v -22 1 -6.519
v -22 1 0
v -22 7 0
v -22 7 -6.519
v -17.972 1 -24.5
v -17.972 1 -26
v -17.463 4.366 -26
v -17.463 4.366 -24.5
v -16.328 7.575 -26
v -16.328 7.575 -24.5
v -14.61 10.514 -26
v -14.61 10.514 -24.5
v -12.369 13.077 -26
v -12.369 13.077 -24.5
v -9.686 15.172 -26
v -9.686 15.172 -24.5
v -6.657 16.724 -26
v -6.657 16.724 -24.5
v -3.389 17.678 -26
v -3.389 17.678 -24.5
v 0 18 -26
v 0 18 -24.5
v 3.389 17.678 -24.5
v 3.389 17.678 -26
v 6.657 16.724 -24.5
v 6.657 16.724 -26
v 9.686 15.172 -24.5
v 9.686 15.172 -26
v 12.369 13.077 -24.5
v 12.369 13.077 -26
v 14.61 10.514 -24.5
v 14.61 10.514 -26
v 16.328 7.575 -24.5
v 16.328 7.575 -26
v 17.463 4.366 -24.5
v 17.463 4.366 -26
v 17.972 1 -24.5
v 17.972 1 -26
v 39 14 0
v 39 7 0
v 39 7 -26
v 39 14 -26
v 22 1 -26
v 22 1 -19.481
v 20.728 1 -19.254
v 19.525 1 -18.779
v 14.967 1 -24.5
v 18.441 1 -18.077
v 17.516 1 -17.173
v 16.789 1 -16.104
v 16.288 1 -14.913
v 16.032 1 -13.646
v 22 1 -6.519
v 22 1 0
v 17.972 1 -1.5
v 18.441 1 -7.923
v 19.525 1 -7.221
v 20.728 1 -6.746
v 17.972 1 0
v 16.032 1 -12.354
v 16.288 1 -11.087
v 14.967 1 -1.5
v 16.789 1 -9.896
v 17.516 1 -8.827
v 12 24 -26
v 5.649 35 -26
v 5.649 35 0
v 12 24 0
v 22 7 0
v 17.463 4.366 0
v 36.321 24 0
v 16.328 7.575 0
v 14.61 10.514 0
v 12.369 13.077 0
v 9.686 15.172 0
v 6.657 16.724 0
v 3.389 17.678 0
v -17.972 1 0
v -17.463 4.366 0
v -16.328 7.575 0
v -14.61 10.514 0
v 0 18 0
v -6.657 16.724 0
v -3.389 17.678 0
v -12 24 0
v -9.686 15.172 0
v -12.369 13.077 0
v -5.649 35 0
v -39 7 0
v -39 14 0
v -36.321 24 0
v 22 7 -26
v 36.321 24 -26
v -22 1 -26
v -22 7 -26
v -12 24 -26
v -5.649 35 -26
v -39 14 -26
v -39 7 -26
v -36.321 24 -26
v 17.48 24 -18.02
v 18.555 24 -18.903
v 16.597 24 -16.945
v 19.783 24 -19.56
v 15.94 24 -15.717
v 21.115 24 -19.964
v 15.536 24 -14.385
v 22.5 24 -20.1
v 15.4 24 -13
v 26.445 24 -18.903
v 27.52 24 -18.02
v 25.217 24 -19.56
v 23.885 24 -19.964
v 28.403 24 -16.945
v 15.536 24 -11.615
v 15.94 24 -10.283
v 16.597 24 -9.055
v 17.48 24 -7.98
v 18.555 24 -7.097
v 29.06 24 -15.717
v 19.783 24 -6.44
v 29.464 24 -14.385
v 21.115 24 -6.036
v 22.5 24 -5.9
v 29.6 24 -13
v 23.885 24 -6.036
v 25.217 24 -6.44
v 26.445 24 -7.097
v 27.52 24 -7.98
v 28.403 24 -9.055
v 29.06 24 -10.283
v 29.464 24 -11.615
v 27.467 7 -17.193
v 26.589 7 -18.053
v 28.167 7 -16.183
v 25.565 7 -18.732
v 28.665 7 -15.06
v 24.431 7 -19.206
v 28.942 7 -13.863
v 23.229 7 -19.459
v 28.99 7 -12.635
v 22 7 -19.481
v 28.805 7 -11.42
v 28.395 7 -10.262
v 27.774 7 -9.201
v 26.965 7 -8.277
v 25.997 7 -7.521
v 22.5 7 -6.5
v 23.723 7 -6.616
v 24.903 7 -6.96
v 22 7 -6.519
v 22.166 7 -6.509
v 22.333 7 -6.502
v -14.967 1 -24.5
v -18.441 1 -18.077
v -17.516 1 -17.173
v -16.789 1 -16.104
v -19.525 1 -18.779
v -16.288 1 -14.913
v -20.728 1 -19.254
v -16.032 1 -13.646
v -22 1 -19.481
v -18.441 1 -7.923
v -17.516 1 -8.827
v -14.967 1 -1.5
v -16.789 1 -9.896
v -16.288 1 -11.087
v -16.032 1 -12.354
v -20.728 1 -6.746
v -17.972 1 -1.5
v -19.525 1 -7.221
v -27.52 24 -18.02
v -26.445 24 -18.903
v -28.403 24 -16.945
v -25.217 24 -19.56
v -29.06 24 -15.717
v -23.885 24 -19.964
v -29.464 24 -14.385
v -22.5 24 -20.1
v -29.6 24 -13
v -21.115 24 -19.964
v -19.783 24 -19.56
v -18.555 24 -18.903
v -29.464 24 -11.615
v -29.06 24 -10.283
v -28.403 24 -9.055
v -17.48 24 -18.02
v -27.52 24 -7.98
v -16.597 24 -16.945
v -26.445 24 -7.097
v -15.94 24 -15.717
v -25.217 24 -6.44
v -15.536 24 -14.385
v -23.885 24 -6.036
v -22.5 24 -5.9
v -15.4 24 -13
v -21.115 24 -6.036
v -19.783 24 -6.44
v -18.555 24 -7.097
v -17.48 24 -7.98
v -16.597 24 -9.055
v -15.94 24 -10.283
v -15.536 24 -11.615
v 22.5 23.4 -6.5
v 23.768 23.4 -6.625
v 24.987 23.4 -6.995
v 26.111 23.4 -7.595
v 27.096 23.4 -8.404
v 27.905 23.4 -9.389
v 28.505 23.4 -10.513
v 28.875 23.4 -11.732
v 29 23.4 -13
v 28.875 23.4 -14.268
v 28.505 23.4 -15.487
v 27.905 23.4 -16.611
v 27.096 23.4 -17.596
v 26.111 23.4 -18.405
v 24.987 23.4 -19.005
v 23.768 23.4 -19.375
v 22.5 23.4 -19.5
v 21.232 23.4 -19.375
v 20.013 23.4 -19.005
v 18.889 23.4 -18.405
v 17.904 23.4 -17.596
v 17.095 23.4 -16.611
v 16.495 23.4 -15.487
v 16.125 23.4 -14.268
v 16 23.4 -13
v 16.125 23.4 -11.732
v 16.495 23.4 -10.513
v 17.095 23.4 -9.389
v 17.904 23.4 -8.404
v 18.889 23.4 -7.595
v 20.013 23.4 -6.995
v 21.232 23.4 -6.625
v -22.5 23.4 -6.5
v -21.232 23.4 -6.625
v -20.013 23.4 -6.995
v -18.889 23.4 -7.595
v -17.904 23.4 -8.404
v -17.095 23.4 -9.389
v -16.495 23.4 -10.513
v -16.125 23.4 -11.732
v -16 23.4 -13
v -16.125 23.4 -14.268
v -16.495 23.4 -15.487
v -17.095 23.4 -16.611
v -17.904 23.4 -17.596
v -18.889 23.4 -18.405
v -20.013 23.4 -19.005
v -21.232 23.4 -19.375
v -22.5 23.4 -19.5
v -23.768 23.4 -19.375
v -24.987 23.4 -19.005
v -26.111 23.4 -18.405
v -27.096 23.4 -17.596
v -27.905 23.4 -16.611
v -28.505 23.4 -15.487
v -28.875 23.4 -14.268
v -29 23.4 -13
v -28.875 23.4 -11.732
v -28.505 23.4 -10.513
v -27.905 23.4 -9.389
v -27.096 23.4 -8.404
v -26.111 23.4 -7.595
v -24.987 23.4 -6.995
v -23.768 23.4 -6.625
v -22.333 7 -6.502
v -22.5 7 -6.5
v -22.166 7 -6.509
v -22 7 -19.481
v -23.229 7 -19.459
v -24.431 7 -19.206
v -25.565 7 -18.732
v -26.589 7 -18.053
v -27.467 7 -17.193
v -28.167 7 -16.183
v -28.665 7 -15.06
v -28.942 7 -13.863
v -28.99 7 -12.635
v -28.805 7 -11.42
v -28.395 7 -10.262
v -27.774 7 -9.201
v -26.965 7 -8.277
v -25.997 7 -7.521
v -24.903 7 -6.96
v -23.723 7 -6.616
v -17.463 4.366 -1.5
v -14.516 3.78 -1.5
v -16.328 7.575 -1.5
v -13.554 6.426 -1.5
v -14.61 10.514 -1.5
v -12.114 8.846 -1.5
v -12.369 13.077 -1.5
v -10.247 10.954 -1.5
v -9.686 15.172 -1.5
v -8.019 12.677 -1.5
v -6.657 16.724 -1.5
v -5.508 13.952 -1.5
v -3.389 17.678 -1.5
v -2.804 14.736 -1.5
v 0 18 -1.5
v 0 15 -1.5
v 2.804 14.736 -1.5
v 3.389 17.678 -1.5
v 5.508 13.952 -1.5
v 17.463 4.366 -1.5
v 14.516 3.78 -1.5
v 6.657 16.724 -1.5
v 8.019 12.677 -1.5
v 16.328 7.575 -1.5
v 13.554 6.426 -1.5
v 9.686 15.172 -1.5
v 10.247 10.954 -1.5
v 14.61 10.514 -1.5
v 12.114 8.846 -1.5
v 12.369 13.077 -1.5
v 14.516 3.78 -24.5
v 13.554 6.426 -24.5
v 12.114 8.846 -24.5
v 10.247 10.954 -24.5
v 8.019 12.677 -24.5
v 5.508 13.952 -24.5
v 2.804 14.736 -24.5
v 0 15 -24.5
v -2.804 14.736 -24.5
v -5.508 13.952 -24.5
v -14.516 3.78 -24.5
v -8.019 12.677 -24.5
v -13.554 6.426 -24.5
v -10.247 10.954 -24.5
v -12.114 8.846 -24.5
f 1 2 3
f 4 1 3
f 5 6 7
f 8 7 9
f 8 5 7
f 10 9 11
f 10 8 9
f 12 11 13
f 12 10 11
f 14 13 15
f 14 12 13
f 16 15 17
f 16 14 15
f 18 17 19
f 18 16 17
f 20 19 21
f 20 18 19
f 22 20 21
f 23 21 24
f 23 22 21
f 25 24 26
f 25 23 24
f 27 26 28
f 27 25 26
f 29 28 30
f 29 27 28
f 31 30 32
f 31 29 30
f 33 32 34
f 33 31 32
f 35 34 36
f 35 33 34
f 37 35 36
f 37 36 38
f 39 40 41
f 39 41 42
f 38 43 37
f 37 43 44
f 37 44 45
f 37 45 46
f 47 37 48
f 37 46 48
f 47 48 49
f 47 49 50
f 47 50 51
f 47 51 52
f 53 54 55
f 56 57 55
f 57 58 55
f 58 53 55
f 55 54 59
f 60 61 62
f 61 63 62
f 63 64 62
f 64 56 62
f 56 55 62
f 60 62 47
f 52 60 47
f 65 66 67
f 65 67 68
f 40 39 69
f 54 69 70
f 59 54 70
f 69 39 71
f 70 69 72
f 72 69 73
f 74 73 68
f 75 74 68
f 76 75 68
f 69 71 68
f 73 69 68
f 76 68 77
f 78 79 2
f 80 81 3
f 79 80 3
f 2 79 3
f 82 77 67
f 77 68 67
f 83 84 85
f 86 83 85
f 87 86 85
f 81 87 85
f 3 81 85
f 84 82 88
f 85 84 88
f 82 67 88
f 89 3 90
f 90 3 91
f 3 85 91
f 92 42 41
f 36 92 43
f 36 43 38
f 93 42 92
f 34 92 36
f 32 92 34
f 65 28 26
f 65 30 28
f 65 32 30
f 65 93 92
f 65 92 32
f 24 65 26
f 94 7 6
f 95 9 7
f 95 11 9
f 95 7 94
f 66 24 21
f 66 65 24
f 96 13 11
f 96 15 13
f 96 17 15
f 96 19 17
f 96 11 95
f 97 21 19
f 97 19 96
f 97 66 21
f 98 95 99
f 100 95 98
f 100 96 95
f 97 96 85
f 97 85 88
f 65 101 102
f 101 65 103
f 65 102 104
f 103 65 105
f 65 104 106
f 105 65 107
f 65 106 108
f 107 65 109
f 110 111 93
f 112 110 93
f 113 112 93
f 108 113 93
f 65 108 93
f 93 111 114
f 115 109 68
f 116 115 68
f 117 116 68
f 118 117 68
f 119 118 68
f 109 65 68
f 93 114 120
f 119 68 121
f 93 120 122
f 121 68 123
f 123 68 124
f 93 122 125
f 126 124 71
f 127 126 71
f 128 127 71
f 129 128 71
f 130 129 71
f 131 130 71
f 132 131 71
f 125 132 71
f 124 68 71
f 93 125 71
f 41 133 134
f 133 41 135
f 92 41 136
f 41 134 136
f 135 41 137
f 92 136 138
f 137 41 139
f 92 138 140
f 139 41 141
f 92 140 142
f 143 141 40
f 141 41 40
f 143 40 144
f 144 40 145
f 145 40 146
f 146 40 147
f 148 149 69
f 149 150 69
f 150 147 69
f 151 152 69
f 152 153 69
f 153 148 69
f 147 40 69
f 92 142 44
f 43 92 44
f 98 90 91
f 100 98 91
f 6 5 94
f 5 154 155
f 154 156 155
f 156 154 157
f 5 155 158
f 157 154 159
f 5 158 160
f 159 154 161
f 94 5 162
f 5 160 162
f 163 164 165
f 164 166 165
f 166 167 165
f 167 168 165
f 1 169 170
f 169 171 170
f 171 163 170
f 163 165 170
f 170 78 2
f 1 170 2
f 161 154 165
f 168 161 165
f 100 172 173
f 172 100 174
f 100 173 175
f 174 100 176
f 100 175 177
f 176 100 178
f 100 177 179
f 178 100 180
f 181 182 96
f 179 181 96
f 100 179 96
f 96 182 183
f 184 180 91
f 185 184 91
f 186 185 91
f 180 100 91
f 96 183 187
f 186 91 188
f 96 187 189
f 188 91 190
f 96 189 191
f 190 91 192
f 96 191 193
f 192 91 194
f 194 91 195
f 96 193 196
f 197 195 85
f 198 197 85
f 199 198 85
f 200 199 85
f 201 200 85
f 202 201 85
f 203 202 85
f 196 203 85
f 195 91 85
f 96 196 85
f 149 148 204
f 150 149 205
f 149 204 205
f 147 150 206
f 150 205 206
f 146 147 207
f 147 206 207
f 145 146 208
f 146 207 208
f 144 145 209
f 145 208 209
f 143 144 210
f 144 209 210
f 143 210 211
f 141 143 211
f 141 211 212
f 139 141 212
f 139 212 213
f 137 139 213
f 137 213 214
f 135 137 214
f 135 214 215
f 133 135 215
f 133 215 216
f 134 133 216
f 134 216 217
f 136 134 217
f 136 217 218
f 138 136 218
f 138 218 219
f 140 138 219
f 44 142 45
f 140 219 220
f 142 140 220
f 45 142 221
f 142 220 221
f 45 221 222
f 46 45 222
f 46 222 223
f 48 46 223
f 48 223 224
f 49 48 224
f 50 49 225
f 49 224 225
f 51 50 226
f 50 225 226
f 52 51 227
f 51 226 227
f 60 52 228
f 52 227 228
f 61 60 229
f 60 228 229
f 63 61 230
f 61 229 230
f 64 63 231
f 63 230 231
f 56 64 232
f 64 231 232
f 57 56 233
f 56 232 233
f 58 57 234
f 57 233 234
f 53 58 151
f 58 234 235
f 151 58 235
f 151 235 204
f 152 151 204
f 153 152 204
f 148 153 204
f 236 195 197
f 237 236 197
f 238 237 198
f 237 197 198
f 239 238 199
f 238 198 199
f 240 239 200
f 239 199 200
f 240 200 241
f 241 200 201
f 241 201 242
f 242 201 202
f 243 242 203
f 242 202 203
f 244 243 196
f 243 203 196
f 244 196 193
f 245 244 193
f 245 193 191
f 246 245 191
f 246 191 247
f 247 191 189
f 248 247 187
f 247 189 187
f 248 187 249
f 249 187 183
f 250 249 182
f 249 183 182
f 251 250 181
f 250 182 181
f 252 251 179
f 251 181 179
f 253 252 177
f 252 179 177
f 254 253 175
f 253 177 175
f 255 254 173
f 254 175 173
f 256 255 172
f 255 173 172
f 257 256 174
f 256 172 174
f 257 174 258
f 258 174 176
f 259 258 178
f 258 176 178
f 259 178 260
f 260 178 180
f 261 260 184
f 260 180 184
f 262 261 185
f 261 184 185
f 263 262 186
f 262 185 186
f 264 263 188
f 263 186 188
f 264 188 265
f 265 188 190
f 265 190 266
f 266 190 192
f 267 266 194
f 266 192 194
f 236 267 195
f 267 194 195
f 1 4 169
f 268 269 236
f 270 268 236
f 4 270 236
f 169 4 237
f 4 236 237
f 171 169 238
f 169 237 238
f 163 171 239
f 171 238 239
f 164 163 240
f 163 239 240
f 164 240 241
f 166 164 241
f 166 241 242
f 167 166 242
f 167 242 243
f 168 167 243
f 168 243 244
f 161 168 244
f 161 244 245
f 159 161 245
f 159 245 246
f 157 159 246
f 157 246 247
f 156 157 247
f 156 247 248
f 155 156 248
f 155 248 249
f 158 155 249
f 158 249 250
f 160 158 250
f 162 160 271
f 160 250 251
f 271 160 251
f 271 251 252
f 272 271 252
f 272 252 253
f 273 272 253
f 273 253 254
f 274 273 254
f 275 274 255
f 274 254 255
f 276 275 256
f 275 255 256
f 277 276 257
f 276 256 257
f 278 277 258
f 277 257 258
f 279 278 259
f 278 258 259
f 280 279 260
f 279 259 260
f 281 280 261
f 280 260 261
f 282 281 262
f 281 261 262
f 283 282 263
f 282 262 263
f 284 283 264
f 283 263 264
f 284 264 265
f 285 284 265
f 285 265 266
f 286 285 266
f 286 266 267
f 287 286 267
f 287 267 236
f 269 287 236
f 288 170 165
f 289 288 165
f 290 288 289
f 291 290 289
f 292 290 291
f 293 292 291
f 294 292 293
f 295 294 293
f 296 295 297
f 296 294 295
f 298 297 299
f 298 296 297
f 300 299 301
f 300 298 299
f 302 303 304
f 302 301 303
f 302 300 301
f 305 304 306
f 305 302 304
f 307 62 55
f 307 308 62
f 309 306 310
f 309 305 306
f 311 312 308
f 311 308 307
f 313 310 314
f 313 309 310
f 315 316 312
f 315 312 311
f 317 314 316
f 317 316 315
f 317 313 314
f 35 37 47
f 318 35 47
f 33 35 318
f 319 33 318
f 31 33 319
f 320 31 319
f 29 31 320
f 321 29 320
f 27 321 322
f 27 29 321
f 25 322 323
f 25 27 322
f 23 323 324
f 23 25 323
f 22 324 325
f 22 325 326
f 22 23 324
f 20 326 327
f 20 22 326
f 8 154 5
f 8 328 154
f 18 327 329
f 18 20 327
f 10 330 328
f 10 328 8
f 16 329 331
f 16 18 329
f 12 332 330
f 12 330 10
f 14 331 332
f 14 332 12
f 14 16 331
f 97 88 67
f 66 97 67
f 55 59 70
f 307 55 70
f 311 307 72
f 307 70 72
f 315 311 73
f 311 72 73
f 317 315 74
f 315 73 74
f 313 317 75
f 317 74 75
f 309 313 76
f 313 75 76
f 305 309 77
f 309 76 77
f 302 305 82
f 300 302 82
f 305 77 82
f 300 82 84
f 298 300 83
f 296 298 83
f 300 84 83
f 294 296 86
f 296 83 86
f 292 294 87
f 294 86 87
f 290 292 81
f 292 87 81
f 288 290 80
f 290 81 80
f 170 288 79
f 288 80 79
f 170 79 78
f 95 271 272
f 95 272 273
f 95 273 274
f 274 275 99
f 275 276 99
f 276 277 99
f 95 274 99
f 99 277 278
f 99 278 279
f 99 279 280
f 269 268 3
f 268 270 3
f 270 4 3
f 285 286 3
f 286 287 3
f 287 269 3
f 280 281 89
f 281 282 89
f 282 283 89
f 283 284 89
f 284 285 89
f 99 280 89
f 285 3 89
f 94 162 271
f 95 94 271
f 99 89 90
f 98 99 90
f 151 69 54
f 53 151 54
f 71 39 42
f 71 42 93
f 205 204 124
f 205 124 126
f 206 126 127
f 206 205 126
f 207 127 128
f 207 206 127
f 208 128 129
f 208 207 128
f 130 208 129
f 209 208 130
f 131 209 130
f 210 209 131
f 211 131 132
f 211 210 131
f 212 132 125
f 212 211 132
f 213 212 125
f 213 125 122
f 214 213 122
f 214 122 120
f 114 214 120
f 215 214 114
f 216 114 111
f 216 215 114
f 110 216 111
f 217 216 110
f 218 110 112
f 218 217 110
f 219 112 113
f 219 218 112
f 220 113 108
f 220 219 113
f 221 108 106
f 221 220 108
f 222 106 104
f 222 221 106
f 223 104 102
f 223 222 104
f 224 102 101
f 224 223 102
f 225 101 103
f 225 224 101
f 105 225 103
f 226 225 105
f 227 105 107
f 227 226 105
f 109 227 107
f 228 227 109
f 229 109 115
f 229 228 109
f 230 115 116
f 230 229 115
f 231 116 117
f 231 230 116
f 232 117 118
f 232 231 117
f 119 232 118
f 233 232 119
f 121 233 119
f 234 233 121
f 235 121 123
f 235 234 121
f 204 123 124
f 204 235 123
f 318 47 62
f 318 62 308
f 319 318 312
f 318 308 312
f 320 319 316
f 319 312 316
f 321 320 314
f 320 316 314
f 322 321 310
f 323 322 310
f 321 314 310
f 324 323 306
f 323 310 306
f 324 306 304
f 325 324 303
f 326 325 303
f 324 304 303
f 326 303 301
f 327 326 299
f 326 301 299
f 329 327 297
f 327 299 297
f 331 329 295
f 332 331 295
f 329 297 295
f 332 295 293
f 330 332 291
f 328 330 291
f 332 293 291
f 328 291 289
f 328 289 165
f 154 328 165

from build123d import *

# Parameters (mm, degrees)
EXTRUDE_1_DEPTH     = 26
SKETCH_2_R          = 15
CUT_EXTRUDE_1_DEPTH = 59.497863209
SKETCH_3_R          = 18
CUT_EXTRUDE_2_DEPTH = 1.5
CUT_EXTRUDE_START   = -1.5
SKETCH_4_R          = 18
CUT_EXTRUDE_3_DEPTH = 1.5
EXTRUDE_2_DEPTH     = 26
SKETCH_6_R          = 6.5
CUT_EXTRUDE_5_DEPTH = 53.211109929
CHAMFER_1_SIZE      = 0.6


with BuildPart() as part:
    # Эскиз1 → Бобышка-Вытянуть1 (new body)
    with BuildSketch(Plane.XY):
        with BuildLine():
            Line((-35.09985755, 24), (-12, 24))
            Line((-12, 24), (-5.649147039, 35))
            Line((-5.649147039, 35), (5.649147039, 35))
            Line((5.649147039, 35), (12, 24))
            Line((12, 24), (35.09985755, 24))
            ThreePointArc((35.09985755, 24), (38.012461407, 15.720824375), (39, 7))
            Line((39, 7), (22, 7))
            Line((22, 7), (22, 1))
            Line((22, 1), (-22, 1))
            Line((-22, 1), (-22, 7))
            Line((-22, 7), (-39, 7))
            ThreePointArc((-39, 7), (-38.012461407, 15.720824375), (-35.09985755, 24))
        make_face()
    extrude(amount=-EXTRUDE_1_DEPTH)

    # Эскиз2 → Вырез-Вытянуть1 (cut, through all)
    with BuildSketch(Plane.XY):
        Circle(SKETCH_2_R)
    extrude(amount=-CUT_EXTRUDE_1_DEPTH, mode=Mode.SUBTRACT)

    # Эскиз3 → Вырез-Вытянуть2 (cut)
    with BuildSketch(Plane.XY):
        Circle(SKETCH_3_R)
    extrude(amount=-CUT_EXTRUDE_2_DEPTH, mode=Mode.SUBTRACT)

    # Эскиз4 → Вырез-Вытянуть3 (cut)
    with BuildSketch(Plane(origin=(0, 0, -26), x_dir=(-1, 0, 0), z_dir=(0, 0, -1)).offset(CUT_EXTRUDE_START)):
        Circle(SKETCH_4_R)
    extrude(amount=CUT_EXTRUDE_3_DEPTH, mode=Mode.SUBTRACT)

    # Эскиз9 → Бобышка-Вытянуть2 (add)
    with BuildSketch(Plane.XY):
        Polygon((-39, 7), (-39, 14), (-36.320508076, 24), (-22, 24), (-22, 7), align=None)
        Polygon((39, 7), (39, 14), (36.320508076, 24), (22, 24), (22, 7), align=None)
    extrude(amount=-EXTRUDE_2_DEPTH)

    # Эскиз6 → Вырез-Вытянуть5 (cut, through all)
    with BuildSketch(Plane(origin=(0, 24, 0), x_dir=(1, 0, 0), z_dir=(0, 1, 0))):
        with Locations(Location((-22.5, 13, 0), (0, 0, 270))):
            Circle(SKETCH_6_R)
        with Locations(Location((22.5, 13, 0), (0, 0, 270))):
            Circle(SKETCH_6_R)
    extrude(amount=-CUT_EXTRUDE_5_DEPTH, mode=Mode.SUBTRACT)

    # Фаска1
    chamfer_1_edges = [part.edges().sort_by_distance(p)[0] for p in [
        (-22.5, 24, -19.5),
        (22.5, 24, -19.5),
    ]]
    chamfer(chamfer_1_edges, length=CHAMFER_1_SIZE)


solid = part.part
